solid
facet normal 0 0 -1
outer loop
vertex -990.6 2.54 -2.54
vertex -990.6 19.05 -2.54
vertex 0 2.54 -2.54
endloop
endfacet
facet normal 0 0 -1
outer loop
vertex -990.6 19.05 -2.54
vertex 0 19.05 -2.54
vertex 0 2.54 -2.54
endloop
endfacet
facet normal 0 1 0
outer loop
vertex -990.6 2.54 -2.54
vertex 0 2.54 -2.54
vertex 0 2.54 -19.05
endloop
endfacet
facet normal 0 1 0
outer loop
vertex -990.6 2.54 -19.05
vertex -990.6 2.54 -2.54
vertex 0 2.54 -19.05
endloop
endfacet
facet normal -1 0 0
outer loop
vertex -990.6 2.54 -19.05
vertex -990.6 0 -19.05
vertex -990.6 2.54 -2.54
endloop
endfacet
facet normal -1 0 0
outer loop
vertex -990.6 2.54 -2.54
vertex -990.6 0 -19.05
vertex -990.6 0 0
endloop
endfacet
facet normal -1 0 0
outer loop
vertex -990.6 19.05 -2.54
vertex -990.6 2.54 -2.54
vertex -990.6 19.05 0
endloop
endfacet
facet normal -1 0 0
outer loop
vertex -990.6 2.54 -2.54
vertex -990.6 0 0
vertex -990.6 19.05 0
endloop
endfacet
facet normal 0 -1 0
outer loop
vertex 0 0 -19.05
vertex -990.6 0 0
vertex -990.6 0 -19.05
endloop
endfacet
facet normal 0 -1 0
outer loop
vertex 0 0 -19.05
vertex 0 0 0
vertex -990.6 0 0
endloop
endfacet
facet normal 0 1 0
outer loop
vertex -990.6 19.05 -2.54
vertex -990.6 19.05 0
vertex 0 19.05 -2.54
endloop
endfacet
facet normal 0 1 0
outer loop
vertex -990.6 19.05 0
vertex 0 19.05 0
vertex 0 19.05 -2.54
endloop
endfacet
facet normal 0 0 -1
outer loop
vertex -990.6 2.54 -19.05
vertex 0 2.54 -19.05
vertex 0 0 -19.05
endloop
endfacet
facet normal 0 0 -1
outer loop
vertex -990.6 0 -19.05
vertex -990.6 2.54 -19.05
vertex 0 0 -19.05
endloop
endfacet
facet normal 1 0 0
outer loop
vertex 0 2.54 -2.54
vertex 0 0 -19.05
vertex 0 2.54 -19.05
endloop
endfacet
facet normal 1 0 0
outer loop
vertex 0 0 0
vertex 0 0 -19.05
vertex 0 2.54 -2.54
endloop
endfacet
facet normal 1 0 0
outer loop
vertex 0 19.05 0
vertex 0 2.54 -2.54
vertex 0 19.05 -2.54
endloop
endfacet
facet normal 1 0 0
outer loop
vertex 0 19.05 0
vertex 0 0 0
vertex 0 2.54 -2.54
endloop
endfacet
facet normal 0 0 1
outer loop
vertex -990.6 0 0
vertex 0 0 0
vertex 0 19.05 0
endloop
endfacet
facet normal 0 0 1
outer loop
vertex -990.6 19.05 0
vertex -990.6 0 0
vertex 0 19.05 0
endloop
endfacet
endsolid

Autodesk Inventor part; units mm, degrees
ref_plane "YZ Plane" through (0, 0, 0) normal (1, 0, 0) x (0, 1, 0)
ref_plane "XZ Plane" through (0, 0, 0) normal (0, 1, 0) x (-1, 0, 0)
ref_plane "XY Plane" through (0, 0, 0) normal (0, 0, 1) x (1, 0, 0)
sketch "Sketch1" plane through (0, 0, 0) normal (1, 0, 0) x (0, 1, 0)
  line L0 (0, 0) -> (0, -19.05)
  line L1 (0, 0) -> (19.05, 0)
  line L2 (19.05, -2.54) -> (2.54, -2.54)
  line L3 (2.54, -2.54) -> (2.54, -19.05)
  line L4 (2.54, -19.05) -> (0, -19.05)
  line L5 (19.05, 0) -> (19.05, -2.54)
  dimension "d0" = 19.05
  dimension "d2" = 19.05
  dimension "d3" = 2.54
extrude "Extrusion1" add sketch "Sketch1" against normal blind 990.6
properties part number "AluminumLchannel"
